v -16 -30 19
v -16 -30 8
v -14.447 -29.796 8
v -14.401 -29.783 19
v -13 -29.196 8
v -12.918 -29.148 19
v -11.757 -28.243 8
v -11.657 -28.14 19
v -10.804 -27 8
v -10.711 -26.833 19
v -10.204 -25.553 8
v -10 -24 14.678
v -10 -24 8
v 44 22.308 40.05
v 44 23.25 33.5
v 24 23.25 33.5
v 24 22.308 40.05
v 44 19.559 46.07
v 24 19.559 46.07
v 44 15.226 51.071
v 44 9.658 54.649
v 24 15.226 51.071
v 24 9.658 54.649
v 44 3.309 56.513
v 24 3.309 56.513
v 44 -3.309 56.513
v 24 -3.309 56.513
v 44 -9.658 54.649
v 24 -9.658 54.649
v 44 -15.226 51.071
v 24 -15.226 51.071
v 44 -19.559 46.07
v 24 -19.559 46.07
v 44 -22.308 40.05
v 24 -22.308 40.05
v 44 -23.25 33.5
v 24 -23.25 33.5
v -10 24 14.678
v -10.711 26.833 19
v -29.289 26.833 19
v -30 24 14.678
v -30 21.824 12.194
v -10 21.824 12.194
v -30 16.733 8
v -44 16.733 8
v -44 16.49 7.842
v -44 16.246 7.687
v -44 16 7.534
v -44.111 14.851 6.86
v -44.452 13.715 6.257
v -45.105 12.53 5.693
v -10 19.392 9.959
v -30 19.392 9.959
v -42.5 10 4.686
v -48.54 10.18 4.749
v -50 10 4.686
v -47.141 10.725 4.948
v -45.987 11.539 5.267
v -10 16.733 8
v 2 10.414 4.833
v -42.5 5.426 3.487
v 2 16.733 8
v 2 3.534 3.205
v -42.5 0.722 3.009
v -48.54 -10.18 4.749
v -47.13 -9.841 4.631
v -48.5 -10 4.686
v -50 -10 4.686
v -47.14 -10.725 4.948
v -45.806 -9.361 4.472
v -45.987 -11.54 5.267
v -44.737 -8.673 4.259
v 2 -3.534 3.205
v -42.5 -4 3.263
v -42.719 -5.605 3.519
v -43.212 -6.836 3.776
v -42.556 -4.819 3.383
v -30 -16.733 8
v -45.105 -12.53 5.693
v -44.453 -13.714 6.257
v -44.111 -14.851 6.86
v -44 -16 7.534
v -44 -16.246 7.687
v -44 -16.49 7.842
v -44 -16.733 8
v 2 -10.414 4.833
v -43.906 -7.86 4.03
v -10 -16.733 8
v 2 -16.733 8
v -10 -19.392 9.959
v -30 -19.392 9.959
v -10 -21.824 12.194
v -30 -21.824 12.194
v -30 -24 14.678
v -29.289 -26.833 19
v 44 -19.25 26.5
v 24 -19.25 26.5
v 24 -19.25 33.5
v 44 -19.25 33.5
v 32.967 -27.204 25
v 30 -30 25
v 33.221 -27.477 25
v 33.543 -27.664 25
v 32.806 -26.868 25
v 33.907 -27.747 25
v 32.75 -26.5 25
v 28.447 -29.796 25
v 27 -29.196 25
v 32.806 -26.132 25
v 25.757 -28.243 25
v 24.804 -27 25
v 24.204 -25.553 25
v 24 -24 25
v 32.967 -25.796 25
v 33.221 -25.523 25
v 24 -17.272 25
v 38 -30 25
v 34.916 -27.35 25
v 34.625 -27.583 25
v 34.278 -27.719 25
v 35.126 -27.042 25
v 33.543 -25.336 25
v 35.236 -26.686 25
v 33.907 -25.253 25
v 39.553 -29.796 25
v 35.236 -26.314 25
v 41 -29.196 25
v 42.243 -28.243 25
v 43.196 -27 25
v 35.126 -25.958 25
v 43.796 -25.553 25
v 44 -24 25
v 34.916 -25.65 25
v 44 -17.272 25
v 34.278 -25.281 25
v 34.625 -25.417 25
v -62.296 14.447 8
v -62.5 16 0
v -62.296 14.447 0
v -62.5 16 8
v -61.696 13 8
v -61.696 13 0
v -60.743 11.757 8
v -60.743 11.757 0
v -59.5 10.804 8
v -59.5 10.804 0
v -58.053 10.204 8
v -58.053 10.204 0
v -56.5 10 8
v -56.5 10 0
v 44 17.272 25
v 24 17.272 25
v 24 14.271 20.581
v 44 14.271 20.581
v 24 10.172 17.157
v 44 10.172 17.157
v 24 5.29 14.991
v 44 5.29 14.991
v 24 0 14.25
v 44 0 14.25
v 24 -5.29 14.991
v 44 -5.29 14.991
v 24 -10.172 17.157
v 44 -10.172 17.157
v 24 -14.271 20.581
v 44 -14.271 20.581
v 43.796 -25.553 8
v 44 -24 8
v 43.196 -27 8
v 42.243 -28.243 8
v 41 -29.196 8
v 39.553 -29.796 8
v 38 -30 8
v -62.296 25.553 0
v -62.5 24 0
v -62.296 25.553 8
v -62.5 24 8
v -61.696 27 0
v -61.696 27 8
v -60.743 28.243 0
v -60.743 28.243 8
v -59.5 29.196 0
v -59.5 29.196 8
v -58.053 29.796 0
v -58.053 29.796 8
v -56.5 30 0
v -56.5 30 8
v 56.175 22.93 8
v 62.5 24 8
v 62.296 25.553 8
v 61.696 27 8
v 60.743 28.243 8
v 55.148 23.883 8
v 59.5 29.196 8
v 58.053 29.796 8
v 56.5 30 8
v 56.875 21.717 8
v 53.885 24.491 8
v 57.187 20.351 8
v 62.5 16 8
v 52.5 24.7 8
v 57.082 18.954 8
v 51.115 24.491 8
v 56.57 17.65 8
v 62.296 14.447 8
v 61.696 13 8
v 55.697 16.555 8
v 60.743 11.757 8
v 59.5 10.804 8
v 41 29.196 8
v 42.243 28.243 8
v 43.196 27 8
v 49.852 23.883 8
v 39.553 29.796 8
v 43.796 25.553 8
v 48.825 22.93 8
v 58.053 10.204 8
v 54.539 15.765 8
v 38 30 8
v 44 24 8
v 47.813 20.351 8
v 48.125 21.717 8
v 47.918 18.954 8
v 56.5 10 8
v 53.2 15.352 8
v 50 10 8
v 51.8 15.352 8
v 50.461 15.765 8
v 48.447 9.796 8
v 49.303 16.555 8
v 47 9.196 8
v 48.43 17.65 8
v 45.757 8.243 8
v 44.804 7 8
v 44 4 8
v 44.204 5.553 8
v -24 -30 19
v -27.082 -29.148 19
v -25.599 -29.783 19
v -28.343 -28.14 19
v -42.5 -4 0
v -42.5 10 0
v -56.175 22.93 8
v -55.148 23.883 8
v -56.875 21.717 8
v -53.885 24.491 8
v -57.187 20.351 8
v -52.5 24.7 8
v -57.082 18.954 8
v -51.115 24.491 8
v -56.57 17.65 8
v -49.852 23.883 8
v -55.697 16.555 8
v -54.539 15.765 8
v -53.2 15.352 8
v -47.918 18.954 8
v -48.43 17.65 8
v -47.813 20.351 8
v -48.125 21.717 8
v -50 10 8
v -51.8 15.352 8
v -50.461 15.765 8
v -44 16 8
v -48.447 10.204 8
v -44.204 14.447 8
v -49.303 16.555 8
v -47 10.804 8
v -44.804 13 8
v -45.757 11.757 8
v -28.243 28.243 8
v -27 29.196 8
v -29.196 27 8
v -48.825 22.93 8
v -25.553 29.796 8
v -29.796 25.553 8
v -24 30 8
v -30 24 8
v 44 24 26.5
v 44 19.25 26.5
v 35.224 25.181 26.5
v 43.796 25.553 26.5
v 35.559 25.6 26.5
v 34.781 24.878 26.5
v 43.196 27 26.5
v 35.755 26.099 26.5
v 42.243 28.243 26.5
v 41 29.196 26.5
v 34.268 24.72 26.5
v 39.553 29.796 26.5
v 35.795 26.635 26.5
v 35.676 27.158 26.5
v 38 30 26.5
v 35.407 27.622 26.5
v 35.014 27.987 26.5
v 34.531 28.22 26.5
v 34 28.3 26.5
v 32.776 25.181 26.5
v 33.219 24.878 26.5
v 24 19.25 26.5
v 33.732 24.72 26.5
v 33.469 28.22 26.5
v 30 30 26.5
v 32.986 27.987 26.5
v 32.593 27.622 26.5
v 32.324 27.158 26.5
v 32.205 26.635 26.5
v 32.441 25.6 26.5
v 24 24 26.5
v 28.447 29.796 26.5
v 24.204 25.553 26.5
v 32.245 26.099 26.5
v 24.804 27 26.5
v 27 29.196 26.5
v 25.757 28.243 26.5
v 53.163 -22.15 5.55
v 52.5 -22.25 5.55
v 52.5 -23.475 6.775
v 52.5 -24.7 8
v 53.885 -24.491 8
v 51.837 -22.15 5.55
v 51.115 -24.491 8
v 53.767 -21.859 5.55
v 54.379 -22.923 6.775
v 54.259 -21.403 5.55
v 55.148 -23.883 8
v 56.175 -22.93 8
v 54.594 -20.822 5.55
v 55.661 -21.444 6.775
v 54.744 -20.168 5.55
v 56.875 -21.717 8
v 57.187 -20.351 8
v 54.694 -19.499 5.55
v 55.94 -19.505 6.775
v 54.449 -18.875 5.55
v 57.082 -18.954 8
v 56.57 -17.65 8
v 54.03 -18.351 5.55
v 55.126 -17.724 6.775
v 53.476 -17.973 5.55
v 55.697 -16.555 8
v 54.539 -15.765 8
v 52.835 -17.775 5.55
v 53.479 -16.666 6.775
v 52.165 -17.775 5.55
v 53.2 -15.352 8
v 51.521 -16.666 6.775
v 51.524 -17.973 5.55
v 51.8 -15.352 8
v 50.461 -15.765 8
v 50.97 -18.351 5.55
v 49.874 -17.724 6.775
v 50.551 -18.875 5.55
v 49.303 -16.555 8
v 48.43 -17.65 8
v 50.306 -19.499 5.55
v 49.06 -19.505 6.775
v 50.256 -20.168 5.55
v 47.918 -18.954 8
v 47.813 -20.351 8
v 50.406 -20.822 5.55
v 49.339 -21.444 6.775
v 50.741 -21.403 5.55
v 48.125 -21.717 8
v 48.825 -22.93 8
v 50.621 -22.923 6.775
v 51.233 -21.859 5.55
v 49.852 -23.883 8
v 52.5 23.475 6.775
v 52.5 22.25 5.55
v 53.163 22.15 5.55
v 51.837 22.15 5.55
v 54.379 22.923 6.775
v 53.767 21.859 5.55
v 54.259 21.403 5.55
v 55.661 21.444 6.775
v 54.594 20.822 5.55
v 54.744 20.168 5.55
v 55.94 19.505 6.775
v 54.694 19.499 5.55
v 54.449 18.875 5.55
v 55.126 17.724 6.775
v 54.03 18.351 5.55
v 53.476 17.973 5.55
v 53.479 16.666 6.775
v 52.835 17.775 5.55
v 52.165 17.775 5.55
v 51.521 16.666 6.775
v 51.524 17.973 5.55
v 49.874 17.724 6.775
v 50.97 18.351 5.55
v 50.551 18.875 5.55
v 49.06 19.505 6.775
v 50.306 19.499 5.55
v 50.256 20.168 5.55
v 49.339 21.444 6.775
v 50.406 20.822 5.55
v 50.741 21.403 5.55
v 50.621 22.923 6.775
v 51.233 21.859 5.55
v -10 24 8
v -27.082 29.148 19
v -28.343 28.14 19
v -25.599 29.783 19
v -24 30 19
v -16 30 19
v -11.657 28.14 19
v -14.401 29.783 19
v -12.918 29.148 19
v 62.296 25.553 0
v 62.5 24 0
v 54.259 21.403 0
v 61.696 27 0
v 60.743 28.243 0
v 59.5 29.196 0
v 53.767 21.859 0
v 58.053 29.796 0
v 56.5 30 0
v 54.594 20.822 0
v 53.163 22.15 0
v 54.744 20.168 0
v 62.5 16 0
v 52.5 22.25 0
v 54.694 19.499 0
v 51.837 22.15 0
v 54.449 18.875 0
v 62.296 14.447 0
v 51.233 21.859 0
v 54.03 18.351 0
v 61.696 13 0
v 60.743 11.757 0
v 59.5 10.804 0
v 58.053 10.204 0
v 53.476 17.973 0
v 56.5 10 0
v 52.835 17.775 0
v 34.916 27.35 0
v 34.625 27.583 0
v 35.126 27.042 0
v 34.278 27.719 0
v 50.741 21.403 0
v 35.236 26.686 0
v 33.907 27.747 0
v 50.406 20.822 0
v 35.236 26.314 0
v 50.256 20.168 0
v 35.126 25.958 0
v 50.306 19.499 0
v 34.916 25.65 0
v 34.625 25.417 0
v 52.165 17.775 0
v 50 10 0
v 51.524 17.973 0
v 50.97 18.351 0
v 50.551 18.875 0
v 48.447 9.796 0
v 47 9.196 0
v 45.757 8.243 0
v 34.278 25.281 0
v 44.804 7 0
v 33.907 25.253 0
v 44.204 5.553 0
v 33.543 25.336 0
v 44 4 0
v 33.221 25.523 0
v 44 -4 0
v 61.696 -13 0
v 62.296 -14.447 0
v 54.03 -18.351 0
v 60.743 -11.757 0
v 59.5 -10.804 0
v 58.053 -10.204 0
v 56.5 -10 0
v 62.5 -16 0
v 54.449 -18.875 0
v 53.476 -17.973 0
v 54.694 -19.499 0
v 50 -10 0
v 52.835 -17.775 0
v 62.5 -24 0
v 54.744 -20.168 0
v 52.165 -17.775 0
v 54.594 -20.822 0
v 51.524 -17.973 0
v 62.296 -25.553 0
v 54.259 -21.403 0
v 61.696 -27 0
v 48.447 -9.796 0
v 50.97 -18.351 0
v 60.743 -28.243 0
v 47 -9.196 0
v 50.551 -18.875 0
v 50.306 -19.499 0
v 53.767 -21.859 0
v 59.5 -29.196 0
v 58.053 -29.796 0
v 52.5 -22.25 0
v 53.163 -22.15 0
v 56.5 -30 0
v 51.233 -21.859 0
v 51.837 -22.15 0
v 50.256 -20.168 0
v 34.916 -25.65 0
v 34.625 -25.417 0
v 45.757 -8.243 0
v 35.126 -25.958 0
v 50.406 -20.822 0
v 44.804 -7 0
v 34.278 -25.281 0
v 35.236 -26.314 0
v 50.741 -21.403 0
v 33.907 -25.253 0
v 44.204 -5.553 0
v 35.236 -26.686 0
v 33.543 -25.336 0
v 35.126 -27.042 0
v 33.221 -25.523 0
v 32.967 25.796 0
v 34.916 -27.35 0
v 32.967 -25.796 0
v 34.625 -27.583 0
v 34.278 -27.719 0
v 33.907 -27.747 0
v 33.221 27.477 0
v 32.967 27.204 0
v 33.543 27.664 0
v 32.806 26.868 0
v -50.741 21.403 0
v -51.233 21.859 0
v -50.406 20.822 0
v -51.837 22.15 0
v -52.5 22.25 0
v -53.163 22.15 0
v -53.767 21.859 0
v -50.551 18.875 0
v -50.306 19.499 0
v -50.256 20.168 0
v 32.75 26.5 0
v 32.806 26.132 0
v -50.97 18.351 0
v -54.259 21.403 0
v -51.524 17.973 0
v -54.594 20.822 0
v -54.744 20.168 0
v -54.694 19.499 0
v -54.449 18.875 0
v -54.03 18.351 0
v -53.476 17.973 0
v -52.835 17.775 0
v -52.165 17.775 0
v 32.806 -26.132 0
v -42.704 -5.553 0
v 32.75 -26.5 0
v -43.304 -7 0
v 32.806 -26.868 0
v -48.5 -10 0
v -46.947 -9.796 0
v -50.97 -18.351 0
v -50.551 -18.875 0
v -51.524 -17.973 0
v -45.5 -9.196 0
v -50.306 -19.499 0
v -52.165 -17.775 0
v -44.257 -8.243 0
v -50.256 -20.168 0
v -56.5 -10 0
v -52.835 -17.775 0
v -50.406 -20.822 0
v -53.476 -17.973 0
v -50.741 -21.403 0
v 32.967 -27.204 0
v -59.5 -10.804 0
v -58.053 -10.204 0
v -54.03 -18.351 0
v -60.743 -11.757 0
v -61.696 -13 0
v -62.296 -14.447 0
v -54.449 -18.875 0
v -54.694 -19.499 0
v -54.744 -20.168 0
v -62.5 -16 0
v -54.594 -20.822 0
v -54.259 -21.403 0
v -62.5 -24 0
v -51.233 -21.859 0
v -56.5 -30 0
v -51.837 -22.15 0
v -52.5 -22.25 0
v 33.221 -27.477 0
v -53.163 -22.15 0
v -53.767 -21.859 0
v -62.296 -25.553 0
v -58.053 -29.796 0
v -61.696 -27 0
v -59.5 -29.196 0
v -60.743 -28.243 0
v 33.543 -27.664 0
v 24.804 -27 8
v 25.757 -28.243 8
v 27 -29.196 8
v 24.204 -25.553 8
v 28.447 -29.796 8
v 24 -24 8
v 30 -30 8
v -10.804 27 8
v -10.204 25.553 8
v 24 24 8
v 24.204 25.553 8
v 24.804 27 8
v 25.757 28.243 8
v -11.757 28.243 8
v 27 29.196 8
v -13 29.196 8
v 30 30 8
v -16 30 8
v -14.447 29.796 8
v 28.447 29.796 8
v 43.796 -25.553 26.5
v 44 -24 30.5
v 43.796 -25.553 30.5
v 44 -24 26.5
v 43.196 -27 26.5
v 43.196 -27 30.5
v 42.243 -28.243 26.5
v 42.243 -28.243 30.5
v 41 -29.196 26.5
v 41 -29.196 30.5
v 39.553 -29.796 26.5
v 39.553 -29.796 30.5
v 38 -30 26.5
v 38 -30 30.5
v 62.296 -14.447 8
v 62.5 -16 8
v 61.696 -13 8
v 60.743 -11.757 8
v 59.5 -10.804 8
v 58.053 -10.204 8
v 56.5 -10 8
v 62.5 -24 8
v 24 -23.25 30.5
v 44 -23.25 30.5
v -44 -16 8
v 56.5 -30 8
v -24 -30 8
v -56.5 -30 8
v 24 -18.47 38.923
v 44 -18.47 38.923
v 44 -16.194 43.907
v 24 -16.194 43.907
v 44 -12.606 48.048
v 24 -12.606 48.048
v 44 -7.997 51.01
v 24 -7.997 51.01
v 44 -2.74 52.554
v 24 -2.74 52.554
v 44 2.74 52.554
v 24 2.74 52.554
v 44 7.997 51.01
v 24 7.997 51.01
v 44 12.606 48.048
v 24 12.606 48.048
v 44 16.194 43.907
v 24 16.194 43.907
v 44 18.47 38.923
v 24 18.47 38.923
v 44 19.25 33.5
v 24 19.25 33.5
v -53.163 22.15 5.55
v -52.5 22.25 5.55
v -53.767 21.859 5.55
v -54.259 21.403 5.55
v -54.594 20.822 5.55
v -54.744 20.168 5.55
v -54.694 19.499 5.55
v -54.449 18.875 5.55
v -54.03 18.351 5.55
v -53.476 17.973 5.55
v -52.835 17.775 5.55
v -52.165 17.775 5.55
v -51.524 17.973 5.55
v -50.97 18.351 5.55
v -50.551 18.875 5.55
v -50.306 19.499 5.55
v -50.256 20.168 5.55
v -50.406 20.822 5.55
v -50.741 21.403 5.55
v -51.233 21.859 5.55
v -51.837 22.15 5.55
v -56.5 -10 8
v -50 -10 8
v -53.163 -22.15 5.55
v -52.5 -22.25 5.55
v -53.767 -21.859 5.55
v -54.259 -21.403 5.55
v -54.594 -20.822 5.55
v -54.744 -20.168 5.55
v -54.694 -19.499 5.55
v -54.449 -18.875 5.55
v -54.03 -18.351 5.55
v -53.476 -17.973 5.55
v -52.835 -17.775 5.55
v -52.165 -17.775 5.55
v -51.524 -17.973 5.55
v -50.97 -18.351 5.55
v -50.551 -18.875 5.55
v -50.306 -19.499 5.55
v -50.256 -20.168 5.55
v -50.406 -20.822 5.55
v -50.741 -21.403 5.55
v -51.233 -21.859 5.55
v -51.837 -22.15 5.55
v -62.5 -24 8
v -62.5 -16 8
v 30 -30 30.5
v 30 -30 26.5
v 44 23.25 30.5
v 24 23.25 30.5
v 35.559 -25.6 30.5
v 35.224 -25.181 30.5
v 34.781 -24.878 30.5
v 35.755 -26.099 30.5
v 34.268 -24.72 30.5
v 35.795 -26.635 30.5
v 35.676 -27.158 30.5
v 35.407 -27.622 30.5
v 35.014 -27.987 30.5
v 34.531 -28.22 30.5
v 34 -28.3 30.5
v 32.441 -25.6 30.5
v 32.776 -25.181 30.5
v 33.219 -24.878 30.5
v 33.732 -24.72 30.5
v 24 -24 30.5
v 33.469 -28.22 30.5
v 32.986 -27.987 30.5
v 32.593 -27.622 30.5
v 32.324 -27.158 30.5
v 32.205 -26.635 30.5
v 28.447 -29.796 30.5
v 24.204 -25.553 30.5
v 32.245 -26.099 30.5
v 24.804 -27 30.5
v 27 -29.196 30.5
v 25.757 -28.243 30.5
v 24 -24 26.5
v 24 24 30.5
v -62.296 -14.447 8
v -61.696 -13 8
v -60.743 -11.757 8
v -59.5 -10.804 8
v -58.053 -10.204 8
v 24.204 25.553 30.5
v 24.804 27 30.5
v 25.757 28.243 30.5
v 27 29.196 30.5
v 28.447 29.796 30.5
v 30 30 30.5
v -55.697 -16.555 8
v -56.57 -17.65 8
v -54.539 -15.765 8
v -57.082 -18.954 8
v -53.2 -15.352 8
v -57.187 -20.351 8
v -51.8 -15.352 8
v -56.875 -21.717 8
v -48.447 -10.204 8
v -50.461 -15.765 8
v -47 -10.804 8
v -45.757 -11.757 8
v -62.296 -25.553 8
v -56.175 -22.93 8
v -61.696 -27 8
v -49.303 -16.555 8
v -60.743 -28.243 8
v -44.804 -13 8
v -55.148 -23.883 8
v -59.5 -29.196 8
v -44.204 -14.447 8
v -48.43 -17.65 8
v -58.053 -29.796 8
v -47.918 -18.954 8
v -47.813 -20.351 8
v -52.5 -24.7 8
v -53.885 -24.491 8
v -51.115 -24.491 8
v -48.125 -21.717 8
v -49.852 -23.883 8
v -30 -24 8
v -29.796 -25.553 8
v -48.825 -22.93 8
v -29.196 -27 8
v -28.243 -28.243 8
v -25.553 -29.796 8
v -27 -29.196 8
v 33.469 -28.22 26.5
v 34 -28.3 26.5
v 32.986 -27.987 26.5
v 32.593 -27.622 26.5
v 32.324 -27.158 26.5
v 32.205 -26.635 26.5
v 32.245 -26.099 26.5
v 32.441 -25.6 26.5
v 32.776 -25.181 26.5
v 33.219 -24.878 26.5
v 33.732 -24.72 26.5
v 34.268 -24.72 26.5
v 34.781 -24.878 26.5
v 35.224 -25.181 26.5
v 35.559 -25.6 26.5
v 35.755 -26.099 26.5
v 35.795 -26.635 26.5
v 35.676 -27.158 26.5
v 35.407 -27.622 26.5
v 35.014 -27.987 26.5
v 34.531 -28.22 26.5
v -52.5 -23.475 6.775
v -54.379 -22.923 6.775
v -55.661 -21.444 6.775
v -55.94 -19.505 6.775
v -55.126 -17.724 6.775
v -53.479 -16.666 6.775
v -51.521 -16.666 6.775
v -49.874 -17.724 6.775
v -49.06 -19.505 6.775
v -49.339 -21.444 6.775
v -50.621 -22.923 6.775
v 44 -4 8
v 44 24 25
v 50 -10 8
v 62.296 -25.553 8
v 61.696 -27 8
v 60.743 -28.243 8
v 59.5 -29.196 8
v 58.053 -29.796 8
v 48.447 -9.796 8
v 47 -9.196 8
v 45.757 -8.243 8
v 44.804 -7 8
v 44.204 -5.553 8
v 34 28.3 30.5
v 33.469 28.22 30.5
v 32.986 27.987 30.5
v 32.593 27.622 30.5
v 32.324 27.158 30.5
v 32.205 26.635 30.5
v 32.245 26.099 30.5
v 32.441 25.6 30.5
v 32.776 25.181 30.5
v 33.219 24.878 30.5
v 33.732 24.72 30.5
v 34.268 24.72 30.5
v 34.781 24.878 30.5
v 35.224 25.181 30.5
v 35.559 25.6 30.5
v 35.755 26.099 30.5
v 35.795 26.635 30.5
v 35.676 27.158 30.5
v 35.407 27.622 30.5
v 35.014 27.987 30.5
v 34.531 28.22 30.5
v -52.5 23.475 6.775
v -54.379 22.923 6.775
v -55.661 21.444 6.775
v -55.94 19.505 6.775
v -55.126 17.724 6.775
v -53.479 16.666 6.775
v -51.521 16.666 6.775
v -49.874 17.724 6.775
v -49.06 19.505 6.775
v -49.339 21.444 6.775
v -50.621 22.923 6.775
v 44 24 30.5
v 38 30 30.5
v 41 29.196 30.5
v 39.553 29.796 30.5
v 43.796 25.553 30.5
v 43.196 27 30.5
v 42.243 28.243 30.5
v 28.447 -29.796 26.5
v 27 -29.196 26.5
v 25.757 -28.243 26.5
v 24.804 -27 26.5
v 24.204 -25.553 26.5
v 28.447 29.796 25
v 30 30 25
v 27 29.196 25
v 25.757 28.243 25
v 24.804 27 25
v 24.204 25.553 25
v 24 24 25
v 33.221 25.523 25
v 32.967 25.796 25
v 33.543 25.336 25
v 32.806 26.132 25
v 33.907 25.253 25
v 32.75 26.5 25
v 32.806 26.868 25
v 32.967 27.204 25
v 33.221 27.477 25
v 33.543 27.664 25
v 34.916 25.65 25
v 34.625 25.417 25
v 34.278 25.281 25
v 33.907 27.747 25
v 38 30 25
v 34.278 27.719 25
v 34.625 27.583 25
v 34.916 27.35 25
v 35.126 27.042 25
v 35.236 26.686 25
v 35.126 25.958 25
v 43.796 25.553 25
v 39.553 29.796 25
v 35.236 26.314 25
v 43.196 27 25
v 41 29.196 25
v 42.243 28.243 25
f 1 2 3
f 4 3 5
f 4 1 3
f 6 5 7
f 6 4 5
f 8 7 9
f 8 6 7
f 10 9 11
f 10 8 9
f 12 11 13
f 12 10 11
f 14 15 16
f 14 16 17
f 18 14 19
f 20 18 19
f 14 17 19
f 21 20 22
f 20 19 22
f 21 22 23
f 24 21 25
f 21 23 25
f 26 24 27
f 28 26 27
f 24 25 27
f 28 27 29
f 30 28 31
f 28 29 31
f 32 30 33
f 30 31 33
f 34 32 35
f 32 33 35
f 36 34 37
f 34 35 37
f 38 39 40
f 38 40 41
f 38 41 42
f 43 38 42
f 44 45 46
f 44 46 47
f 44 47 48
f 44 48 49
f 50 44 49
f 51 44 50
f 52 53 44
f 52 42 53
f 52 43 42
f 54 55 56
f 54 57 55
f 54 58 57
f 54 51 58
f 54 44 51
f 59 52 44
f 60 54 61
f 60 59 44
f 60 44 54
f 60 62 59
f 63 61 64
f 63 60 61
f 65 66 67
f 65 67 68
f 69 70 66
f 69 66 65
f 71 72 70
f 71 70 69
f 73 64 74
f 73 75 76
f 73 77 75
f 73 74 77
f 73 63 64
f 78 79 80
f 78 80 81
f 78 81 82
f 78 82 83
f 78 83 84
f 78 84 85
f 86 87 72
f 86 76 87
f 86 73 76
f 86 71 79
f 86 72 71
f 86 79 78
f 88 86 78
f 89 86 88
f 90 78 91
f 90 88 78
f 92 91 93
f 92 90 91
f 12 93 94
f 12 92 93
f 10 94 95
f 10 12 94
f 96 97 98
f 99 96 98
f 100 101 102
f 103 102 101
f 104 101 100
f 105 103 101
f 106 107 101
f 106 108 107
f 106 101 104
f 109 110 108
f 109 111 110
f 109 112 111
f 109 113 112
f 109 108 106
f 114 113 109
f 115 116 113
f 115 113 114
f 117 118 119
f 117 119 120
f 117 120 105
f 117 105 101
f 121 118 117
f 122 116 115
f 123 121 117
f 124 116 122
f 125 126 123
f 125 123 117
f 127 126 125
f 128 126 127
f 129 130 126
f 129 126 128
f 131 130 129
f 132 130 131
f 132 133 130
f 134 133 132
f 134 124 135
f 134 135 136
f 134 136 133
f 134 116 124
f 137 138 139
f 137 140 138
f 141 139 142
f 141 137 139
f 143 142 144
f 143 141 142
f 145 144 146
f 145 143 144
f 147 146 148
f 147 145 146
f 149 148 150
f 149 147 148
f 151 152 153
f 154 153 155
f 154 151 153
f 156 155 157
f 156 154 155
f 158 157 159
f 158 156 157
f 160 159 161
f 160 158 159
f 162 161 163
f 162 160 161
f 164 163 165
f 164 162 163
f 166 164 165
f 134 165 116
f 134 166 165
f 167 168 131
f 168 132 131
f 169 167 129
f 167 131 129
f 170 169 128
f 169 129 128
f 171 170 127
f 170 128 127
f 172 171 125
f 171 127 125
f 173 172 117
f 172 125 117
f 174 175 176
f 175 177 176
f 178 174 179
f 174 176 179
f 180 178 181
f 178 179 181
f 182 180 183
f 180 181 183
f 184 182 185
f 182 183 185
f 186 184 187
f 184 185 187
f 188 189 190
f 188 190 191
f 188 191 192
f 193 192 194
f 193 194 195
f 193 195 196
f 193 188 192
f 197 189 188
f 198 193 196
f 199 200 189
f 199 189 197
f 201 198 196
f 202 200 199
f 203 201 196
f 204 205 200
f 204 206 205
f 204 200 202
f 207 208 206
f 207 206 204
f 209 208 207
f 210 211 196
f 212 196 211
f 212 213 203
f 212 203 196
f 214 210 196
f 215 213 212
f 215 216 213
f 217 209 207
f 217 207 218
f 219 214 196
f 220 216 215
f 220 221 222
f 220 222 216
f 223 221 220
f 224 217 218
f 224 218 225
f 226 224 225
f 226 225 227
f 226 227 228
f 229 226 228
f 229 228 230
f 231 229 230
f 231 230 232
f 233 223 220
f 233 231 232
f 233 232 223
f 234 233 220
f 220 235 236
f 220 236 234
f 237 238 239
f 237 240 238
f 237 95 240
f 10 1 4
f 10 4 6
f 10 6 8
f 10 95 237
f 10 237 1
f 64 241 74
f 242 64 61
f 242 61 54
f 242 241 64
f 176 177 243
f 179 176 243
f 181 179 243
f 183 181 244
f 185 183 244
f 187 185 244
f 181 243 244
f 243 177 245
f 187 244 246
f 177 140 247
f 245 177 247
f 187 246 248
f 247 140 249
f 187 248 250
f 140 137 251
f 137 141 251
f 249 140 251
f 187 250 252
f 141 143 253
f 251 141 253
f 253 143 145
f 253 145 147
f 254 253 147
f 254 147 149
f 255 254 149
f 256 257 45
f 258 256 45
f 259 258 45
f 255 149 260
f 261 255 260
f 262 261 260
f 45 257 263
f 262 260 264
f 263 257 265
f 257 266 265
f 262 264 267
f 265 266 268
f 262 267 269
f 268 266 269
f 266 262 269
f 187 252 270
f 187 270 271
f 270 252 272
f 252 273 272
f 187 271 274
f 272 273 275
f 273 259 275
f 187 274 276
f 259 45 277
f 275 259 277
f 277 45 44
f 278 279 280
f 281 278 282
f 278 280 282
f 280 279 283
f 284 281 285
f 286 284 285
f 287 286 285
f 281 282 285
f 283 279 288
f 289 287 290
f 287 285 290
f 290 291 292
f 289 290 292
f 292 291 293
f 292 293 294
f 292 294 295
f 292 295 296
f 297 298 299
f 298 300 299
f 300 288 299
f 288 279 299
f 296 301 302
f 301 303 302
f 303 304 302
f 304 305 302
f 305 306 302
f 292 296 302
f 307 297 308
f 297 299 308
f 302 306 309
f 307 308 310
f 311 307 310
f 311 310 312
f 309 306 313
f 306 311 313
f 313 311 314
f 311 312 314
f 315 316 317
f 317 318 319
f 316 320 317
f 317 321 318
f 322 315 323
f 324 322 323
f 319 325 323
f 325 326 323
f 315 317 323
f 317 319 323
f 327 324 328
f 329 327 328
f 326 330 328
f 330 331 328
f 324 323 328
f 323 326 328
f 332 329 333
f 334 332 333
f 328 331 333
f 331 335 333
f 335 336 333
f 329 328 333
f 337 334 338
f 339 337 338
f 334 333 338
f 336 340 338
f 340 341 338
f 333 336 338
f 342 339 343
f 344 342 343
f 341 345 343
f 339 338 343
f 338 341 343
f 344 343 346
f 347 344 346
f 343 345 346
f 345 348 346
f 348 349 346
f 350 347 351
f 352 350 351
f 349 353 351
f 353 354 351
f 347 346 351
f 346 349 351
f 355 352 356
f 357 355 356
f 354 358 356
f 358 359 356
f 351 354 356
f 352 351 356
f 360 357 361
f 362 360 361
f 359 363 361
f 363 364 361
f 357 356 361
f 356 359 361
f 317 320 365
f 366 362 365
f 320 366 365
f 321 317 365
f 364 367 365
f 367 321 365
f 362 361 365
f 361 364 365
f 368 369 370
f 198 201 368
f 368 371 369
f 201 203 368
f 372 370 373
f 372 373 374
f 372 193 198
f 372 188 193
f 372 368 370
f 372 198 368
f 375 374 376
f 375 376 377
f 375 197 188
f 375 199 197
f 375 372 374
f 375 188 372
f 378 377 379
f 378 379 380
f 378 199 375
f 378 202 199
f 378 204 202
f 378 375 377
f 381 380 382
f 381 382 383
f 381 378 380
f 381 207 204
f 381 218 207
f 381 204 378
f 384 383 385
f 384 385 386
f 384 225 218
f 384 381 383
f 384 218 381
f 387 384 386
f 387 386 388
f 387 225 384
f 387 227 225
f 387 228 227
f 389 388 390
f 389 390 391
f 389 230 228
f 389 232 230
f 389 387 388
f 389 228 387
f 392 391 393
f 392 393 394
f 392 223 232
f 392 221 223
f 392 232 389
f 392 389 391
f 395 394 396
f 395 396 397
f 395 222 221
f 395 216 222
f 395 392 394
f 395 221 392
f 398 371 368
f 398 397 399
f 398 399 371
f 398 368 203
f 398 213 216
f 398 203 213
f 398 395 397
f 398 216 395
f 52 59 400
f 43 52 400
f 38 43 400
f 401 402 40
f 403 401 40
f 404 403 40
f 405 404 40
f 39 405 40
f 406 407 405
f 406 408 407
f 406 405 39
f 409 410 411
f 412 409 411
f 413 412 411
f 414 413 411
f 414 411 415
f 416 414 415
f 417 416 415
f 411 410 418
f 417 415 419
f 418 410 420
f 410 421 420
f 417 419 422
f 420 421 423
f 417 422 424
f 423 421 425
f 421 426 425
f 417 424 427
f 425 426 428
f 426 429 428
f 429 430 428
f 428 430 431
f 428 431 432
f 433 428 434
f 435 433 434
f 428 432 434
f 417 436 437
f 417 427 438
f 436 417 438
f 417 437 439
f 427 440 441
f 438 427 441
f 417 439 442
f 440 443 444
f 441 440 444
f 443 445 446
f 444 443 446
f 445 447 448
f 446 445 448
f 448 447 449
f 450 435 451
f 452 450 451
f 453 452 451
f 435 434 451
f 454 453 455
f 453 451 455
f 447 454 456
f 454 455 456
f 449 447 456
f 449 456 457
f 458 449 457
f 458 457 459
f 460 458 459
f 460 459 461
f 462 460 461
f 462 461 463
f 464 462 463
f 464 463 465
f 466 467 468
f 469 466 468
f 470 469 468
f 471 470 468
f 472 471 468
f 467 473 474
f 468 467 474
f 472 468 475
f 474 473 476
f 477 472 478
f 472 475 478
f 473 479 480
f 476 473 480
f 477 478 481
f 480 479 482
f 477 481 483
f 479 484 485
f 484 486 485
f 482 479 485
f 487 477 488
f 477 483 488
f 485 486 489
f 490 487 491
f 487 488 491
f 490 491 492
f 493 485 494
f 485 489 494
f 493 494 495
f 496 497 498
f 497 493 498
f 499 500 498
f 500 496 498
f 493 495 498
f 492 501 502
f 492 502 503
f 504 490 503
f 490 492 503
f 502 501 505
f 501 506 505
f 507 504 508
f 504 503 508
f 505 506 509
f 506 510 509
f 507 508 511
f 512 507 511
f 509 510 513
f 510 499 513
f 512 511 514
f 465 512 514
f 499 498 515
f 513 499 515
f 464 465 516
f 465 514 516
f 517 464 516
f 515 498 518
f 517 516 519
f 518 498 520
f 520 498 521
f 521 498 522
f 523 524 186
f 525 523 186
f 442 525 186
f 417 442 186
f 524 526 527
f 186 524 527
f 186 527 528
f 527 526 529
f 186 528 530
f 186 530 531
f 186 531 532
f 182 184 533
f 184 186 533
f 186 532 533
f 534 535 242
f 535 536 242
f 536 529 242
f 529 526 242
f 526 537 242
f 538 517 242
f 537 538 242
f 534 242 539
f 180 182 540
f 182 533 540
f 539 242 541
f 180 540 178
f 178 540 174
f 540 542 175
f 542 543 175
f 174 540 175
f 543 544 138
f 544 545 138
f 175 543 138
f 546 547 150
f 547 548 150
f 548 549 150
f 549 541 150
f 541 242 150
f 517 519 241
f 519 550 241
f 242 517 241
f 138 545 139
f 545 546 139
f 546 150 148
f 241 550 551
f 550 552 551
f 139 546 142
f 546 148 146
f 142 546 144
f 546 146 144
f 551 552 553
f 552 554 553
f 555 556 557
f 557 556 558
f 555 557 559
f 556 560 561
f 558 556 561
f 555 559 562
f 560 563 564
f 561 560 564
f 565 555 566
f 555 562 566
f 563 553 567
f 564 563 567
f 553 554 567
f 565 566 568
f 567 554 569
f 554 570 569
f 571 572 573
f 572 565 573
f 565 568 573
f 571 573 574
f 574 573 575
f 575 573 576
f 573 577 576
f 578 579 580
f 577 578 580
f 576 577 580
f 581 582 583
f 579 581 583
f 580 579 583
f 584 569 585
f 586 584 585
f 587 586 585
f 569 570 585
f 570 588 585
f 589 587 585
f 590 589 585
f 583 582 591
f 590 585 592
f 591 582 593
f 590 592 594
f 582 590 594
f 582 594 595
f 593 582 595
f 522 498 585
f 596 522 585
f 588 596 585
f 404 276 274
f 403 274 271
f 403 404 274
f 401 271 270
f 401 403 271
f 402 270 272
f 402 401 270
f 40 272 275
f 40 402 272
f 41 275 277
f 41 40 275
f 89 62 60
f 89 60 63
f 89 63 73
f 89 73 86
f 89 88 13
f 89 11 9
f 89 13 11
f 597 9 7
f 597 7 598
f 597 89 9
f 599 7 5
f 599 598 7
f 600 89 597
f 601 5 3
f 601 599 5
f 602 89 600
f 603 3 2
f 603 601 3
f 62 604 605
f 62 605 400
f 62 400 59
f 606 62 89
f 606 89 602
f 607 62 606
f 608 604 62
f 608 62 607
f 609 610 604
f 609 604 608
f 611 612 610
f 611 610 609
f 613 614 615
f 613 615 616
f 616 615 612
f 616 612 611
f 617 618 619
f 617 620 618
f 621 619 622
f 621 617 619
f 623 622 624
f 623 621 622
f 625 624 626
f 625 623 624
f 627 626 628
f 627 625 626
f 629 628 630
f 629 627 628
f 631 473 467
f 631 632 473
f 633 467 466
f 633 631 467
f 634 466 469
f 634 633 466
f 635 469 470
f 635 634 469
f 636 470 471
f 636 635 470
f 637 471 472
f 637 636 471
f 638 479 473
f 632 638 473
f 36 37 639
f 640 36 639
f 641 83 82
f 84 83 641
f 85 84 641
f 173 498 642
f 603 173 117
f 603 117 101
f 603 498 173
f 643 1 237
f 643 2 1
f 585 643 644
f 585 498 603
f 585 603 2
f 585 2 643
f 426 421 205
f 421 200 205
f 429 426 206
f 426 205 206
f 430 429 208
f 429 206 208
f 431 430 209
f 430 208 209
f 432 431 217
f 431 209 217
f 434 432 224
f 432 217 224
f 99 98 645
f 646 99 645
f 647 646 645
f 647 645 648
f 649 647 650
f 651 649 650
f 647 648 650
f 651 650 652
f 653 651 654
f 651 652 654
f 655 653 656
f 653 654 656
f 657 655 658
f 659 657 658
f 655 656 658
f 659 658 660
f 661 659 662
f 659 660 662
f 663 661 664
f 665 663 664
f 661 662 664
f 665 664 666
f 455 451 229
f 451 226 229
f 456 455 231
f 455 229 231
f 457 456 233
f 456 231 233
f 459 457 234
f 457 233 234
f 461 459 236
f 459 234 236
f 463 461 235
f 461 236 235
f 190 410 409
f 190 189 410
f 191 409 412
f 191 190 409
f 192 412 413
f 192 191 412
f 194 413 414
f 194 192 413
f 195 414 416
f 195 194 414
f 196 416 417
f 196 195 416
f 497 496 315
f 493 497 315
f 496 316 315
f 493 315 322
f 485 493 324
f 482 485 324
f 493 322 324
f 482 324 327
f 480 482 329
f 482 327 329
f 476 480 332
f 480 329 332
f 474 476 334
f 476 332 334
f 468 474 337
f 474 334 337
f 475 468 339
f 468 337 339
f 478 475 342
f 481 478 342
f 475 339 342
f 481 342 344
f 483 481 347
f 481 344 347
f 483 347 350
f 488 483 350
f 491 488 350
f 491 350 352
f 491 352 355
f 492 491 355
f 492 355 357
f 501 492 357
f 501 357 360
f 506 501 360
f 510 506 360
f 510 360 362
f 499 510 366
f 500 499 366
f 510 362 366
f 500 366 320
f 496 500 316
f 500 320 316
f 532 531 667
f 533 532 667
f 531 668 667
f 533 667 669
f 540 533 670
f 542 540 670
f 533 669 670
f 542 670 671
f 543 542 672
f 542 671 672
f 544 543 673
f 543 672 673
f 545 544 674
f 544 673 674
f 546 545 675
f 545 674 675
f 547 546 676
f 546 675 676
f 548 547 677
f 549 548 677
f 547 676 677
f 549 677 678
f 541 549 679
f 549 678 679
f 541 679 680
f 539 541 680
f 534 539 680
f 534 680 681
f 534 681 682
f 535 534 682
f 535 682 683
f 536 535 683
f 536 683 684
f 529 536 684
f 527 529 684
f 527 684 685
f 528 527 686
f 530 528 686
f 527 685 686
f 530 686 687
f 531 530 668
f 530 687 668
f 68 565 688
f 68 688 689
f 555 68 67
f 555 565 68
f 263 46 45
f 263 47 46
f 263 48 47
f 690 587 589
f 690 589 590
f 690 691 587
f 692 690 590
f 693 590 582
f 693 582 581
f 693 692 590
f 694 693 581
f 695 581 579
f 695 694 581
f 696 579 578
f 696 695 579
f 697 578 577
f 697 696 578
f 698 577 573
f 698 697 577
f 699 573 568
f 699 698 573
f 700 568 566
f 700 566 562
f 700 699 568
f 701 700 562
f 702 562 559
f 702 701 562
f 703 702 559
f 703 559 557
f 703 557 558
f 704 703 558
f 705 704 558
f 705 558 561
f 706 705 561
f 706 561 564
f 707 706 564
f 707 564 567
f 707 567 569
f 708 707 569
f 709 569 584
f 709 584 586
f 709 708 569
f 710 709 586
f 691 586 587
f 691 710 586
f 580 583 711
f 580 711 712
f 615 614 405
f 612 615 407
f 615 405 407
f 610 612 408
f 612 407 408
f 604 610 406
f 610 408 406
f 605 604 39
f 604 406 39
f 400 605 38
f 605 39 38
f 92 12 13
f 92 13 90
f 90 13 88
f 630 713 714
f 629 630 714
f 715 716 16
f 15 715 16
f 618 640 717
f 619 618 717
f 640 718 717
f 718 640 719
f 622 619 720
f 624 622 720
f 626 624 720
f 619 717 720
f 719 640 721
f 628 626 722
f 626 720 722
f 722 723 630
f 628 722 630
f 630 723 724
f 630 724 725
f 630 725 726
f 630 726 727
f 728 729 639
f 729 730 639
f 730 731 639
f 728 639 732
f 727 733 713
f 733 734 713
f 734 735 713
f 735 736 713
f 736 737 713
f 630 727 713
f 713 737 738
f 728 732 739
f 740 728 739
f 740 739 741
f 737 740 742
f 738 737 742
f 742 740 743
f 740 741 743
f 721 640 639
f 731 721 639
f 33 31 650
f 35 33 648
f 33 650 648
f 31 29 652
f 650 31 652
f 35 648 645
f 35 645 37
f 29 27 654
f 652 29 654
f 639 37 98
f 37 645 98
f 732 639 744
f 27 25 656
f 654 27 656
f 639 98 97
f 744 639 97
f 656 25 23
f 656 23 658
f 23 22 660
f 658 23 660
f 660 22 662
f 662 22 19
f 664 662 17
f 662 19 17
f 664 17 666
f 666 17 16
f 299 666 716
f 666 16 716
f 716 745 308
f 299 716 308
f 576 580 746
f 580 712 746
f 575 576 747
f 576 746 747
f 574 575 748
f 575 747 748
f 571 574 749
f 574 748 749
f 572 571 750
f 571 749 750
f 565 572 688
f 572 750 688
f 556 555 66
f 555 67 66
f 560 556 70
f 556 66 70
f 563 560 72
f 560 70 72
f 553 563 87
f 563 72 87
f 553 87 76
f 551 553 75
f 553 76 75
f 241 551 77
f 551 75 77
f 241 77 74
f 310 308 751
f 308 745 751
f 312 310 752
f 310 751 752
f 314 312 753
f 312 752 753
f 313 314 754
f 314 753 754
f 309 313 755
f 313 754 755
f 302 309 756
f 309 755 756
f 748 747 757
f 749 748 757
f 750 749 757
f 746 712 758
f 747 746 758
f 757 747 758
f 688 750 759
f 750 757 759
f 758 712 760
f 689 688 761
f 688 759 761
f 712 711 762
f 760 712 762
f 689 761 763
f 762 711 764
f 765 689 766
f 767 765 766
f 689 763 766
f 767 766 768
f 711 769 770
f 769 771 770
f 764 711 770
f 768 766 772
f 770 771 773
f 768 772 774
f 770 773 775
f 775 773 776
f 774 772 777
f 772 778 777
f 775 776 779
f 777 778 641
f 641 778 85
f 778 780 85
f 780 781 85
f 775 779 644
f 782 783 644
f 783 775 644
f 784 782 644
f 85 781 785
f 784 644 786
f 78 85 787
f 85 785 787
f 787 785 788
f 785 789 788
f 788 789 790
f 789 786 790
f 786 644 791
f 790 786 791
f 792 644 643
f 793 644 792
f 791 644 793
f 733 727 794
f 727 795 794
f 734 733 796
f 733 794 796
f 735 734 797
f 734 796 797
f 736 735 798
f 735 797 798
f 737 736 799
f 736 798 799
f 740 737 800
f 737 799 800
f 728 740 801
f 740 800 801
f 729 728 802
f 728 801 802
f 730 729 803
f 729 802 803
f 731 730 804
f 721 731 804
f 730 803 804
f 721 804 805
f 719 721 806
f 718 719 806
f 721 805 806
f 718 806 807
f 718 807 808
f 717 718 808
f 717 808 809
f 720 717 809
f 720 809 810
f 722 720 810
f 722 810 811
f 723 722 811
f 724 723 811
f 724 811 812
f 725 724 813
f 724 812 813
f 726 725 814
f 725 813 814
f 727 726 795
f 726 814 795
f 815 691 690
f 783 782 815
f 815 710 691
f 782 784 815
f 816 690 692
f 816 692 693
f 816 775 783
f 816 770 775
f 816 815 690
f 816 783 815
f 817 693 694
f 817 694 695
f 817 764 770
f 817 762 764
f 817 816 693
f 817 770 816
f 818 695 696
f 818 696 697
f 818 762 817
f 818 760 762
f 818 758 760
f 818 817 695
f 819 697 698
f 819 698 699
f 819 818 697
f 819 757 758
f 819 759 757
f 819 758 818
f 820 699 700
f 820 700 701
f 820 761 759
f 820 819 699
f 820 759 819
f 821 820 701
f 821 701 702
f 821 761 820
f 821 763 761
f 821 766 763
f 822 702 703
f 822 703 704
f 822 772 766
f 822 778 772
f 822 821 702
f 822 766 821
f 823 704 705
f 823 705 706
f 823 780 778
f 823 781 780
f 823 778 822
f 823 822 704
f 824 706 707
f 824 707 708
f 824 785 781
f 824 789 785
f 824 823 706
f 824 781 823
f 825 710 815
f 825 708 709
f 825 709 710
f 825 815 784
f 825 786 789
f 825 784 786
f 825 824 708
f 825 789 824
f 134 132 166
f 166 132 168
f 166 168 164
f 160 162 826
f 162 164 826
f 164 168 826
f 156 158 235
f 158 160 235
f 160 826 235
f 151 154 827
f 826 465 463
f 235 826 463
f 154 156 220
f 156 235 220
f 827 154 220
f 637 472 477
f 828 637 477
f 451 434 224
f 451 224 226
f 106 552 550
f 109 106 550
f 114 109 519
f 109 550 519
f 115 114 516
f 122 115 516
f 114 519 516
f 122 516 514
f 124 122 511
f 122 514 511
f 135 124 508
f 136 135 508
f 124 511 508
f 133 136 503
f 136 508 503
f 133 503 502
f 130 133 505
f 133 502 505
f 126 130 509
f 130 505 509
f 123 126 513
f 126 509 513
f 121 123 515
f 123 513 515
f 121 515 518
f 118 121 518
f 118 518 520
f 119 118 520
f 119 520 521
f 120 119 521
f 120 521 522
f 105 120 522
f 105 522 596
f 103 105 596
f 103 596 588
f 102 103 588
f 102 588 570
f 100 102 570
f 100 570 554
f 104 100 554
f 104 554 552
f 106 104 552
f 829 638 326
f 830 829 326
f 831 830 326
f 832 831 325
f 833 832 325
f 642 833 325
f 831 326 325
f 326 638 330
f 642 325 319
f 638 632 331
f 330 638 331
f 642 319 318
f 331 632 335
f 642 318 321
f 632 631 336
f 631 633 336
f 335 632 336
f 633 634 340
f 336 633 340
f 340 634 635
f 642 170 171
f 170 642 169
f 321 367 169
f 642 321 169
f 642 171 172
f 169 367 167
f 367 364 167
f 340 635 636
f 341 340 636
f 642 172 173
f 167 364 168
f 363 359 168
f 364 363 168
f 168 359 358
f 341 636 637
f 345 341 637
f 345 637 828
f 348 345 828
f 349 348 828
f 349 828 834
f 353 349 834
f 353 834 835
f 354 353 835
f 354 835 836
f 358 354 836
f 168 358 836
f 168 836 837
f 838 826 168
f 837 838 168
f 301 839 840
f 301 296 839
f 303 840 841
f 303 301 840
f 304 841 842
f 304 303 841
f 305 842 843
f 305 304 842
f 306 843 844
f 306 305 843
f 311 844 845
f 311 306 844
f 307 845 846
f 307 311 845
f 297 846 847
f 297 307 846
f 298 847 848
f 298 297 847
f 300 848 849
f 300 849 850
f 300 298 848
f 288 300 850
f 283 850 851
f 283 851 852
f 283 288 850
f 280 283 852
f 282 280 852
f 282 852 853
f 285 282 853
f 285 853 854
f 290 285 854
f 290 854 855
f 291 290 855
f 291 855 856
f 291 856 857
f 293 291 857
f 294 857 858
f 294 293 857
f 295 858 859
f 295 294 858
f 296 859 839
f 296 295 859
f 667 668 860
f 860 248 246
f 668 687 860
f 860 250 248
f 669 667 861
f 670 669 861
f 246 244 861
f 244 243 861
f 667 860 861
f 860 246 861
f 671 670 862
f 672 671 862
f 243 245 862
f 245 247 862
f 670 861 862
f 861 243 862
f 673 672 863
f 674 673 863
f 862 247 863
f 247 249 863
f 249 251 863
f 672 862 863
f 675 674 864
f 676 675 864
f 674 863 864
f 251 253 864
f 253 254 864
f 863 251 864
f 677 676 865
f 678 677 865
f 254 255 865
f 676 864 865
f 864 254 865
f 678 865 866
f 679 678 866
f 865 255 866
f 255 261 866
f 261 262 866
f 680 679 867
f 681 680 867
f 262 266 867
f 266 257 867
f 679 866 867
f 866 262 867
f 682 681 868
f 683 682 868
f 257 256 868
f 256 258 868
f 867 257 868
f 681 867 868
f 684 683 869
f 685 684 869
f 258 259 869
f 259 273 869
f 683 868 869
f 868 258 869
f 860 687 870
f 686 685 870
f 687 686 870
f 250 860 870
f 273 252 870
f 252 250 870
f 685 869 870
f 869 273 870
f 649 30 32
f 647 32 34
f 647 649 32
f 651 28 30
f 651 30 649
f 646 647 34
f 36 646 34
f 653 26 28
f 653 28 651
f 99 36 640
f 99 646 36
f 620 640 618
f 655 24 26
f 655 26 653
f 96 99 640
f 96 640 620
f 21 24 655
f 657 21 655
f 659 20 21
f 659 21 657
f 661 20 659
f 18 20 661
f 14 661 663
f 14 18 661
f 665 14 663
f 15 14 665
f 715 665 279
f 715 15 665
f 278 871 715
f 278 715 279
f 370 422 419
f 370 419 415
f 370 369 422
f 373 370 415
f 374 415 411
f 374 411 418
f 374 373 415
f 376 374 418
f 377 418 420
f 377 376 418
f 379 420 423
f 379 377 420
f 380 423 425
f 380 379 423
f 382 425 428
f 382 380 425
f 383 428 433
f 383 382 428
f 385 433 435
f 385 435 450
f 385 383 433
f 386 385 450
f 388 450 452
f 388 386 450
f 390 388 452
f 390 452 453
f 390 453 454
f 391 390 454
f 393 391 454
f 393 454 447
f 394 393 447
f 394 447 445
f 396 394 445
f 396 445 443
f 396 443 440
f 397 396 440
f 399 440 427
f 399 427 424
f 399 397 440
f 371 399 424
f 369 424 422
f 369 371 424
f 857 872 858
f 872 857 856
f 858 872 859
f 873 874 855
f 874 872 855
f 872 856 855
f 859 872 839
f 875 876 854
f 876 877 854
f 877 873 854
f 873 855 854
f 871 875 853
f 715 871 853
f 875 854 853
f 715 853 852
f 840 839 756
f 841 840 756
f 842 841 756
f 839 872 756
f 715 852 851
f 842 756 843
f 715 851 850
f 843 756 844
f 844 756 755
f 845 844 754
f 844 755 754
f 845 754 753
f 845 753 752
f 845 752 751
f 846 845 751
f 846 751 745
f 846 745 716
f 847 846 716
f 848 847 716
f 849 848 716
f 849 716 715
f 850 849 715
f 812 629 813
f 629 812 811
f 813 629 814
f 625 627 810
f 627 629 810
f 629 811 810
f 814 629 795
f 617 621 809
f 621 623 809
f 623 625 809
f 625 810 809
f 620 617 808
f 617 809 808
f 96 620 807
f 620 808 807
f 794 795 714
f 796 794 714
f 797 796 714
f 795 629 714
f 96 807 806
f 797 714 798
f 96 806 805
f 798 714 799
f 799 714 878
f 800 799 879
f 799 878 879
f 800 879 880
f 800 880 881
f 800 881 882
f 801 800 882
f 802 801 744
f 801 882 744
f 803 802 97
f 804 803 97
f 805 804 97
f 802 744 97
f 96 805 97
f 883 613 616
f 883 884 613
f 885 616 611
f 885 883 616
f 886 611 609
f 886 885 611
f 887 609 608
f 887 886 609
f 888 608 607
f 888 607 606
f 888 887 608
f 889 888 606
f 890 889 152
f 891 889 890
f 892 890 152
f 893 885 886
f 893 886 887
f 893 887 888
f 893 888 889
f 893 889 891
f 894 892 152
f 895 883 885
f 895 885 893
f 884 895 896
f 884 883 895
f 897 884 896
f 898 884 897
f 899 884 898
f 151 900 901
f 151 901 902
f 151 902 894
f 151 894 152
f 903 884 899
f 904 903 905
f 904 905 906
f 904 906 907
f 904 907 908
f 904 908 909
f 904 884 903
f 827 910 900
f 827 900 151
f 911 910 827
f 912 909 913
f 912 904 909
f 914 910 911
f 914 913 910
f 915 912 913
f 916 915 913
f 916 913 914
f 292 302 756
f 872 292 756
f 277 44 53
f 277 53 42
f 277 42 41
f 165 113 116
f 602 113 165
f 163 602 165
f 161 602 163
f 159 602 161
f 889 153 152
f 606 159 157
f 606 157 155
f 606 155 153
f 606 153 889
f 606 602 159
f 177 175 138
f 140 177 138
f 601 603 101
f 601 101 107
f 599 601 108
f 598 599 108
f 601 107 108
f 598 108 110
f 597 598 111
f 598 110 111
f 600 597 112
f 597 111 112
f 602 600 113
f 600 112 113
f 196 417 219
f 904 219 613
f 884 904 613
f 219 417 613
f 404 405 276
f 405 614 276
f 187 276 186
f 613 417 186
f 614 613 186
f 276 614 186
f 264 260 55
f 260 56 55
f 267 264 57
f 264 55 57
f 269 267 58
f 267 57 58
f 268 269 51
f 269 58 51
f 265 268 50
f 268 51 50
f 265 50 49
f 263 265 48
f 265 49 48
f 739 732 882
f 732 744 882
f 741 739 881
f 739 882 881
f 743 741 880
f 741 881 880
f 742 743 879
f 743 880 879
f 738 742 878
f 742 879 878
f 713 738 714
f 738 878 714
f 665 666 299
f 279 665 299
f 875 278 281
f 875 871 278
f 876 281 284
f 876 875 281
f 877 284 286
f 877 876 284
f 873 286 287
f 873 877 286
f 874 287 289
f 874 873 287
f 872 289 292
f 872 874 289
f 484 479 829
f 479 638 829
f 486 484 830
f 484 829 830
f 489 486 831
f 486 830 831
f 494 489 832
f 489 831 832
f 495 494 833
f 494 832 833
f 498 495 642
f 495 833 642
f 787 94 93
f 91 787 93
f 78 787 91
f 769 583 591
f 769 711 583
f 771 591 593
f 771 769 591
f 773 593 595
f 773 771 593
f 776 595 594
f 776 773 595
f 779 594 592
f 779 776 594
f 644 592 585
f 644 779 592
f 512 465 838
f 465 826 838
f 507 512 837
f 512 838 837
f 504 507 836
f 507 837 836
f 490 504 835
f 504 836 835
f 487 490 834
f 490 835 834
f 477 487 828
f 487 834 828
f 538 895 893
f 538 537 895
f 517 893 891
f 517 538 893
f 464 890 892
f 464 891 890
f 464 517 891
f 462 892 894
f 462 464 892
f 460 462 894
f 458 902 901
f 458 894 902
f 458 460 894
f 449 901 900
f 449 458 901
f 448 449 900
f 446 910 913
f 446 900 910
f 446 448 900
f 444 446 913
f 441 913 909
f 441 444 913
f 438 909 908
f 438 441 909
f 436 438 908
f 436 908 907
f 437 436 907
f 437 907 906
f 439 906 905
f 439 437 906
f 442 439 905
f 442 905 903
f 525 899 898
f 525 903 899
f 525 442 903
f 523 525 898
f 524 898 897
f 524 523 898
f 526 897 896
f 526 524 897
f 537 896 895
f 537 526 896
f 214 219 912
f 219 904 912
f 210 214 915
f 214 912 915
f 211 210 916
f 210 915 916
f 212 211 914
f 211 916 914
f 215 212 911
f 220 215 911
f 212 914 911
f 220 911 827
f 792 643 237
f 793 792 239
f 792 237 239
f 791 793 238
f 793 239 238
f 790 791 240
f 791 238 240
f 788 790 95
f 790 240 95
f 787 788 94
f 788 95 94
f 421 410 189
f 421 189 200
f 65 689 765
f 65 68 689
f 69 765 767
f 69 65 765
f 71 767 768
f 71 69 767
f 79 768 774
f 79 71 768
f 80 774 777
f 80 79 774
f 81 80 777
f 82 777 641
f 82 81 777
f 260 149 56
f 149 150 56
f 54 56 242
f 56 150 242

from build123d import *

# Parameters (mm, degrees)
BASE_SKETCH_W               = 85
BASE_SKETCH_H               = 60
BASE_EXTRUDE_DEPTH          = 8
CRADLE_SKETCH_W             = 20
CRADLE_SKETCH_H             = 60
CRADLE_EXTRUDE_DEPTH        = 25
MOUNTING_TAB_SKETCH_W       = 20
MOUNTING_TAB_SKETCH_H       = 20
MOUNTING_TAB_EXTRUDE_DEPTH  = 8
MOUNTING_TAB_FILLET_R       = 6
MOVE_START                  = 19
MOVE_FACE_OUTLINE_W         = 20
MOVE_FACE_OUTLINE_H         = 60
MOVE_FACE_DEPTH             = 6
CLAMP_THREADED_HOLE_D       = 2.5
MOTOR_START                 = 24
MOTOR_CLAMP_EXTRUDE_DEPTH   = 20
SKETCH9_W                   = 1.8
SKETCH9_H                   = 4
BASE_CORNER_FILLETS_R       = 6
BASE_INISDE_CORNER_FILLET_R = 6
CLAMP_CORNER_FILLETS_R      = 6


# Read off the part's stored shape, not the designer's step: Move Face
with BuildPart() as part:
    # Base Sketch → Base Extrude (new body)
    with BuildSketch(Plane.XY):
        Rectangle(BASE_SKETCH_W, BASE_SKETCH_H)
    extrude(amount=BASE_EXTRUDE_DEPTH)

    # Cradle Sketch → Cradle Extrude (add)
    with BuildSketch(Plane.XY):
        with Locations((-20, 0)):
            Rectangle(CRADLE_SKETCH_W, CRADLE_SKETCH_H)
        with Locations((34, 0)):
            Rectangle(CRADLE_SKETCH_W, CRADLE_SKETCH_H)
    extrude(amount=CRADLE_EXTRUDE_DEPTH)


with BuildPart() as body_2:
    # Mounting Tab Sketch → Mounting Tab Extrude (new body)
    with BuildSketch(Plane.XY):
        with Locations((-52.5, -20)):
            Rectangle(MOUNTING_TAB_SKETCH_W, MOUNTING_TAB_SKETCH_H)
    extrude(amount=MOUNTING_TAB_EXTRUDE_DEPTH)

    # Mounting Tab M4 CS Clearance Hole Profile Sketch → Mounting Tab M4 Counter Sink Clearance Hole (revolve, cut)
    with BuildSketch(Plane(origin=(-52.5, -20, 8), x_dir=(0, -1, 0), z_dir=(1, 0, 0))):
        Polygon((0, 0), (0, 8), (2.25, 8), (2.25, 2.45), (4.7, 0), align=None)
    revolve(axis=Axis((-52.5, -20, 14.35), (0, 0, -1)), mode=Mode.SUBTRACT)

    # Mounting Tab Fillet
    mounting_tab_fillet_edges = [body_2.edges().sort_by_distance(p)[0] for p in [
        (-62.5, -30, 4),
        (-62.5, -10, 4),
    ]]
    fillet(mounting_tab_fillet_edges, radius=MOUNTING_TAB_FILLET_R)


with BuildPart() as body_3:
    # Mounting Tab Mirror Lengthwise: mirrored copy
    add(body_2.part.mirror(Plane(origin=(0, 0, 0), x_dir=(0, 0, 1), z_dir=(1, 0, 0))))


with BuildPart() as body_4:
    # Mounting Tab Mirror Width: mirrored copy
    add(body_2.part.mirror(Plane.ZX))


with BuildPart() as body_5:
    # Mounting Tab Mirror Width 2: mirrored copy
    add(body_3.part.mirror(Plane.ZX))


with BuildPart() as part_1:
    add(part.part)

    # Base and Tabs Combine: union body 2, body 3, body 4, body 5
    add(body_2.part)
    add(body_3.part)
    add(body_4.part)
    add(body_5.part)

    # Pump and Motor Revolve Cut Sketch → Pump and Motor Revolve Cut (revolve, cut)
    with BuildSketch(Plane(origin=(0, 0, 0), x_dir=(1, 0, 0), z_dir=(0, 1, 0))):
        Polygon((-44, -33.5), (-44, -3), (2, -3), (2, -14.25), (66, -14.25), (66, -33.5), align=None)
    revolve(axis=Axis((66, 0, 33.5), (-1, 0, 0)), mode=Mode.SUBTRACT)

    # Move Face outline → Move Face (cut)
    with BuildSketch(Plane.XY.offset(MOVE_START)):
        with Locations((-20, 0)):
            Rectangle(MOVE_FACE_OUTLINE_W, MOVE_FACE_OUTLINE_H)
    extrude(amount=MOVE_FACE_DEPTH, mode=Mode.SUBTRACT)

    # Clamp Threaded Hole (through all)
    with Locations(Plane.XY.offset(25)):
        with Locations((34, -26.5)):
            clamp_threaded_hole = Hole(CLAMP_THREADED_HOLE_D / 2)


with BuildPart() as body_2_2:
    # Hold Down Bracket Sketch → Motor Clamp Extrude (new body)
    with BuildSketch(Plane(origin=(0, 0, 0), x_dir=(0, 0, -1), z_dir=(1, 0, 0)).offset(MOTOR_START)):
        with BuildLine():
            Line((-33.5, -23.25), (-30.5, -23.25))
            Line((-30.5, -23.25), (-30.5, -30))
            Line((-30.5, -30), (-26.5, -30))
            Line((-26.5, -30), (-26.5, -19.25))
            Line((-26.5, -19.25), (-33.5, -19.25))
            ThreePointArc((-33.5, -19.25), (-52.75, 0), (-33.5, 19.25))
            Line((-33.5, 19.25), (-26.5, 19.25))
            Line((-26.5, 19.25), (-26.5, 30))
            Line((-26.5, 30), (-30.5, 30))
            Line((-30.5, 30), (-30.5, 23.25))
            Line((-30.5, 23.25), (-33.5, 23.25))
            ThreePointArc((-33.5, 23.25), (-56.75, 0), (-33.5, -23.25))
        make_face()
    extrude(amount=MOTOR_CLAMP_EXTRUDE_DEPTH)

    # Sketch9 → Clamp Clearance Hole (revolve, cut)
    with BuildSketch(Plane(origin=(34, -26.5, 30.5), x_dir=(0, -1, 0), z_dir=(1, 0, 0))):
        with Locations((0.9, 2)):
            Rectangle(SKETCH9_W, SKETCH9_H)
    clamp_clearance_hole = revolve(axis=Axis((34, -26.5, 36.85), (0, 0, -1)), mode=Mode.SUBTRACT)


with BuildPart() as motor_clamp_screw_holes_mirror_tool:
    # Motor Clamp Screw Holes Mirror: Clamp Threaded Hole, Clamp Clearance Hole across plane
    add(clamp_threaded_hole.mirror(Plane.ZX))
    add(clamp_clearance_hole.mirror(Plane.ZX))


with BuildPart() as part_2:
    add(part_1.part)

    # Motor Clamp Screw Holes Mirror: cut by motor_clamp_screw_holes_mirror_tool
    add(motor_clamp_screw_holes_mirror_tool.part, mode=Mode.SUBTRACT)

    # Base Corner Fillets
    base_corner_fillets_edges = [part_2.edges().sort_by_distance(p)[0] for p in [
        (44, -10, 4),
        (-10, -30, 13.5),
        (-30, -30, 13.5),
        (-30, 30, 13.5),
        (-10, 30, 13.5),
        (44, -30, 16.5),
        (24, -30, 16.5),
        (24, 30, 16.5),
        (44, 30, 16.5),
        (-44, -10, 6.342970466),
        (44, 10, 4),
        (-44, 10, 6.342970466),
    ]]
    fillet(base_corner_fillets_edges, radius=BASE_CORNER_FILLETS_R)

    # Base Inisde Corner Fillet
    base_inisde_corner_fillet_edges = [part_2.edges().sort_by_distance(p)[0] for p in [
        (-42.5, -10, 2.342970466),
    ]]
    fillet(base_inisde_corner_fillet_edges, radius=BASE_INISDE_CORNER_FILLET_R)


with BuildPart() as body_2_2_1:
    add(body_2_2.part)

    # Motor Clamp Screw Holes Mirror: cut by motor_clamp_screw_holes_mirror_tool
    add(motor_clamp_screw_holes_mirror_tool.part, mode=Mode.SUBTRACT)

    # Clamp Corner Fillets
    clamp_corner_fillets_edges = [body_2_2_1.edges().sort_by_distance(p)[0] for p in [
        (24, -30, 28.5),
        (24, 30, 28.5),
        (44, 30, 28.5),
        (44, -30, 28.5),
    ]]
    fillet(clamp_corner_fillets_edges, radius=CLAMP_CORNER_FILLETS_R)


solid = Compound([part_2.part, body_2_2_1.part])
